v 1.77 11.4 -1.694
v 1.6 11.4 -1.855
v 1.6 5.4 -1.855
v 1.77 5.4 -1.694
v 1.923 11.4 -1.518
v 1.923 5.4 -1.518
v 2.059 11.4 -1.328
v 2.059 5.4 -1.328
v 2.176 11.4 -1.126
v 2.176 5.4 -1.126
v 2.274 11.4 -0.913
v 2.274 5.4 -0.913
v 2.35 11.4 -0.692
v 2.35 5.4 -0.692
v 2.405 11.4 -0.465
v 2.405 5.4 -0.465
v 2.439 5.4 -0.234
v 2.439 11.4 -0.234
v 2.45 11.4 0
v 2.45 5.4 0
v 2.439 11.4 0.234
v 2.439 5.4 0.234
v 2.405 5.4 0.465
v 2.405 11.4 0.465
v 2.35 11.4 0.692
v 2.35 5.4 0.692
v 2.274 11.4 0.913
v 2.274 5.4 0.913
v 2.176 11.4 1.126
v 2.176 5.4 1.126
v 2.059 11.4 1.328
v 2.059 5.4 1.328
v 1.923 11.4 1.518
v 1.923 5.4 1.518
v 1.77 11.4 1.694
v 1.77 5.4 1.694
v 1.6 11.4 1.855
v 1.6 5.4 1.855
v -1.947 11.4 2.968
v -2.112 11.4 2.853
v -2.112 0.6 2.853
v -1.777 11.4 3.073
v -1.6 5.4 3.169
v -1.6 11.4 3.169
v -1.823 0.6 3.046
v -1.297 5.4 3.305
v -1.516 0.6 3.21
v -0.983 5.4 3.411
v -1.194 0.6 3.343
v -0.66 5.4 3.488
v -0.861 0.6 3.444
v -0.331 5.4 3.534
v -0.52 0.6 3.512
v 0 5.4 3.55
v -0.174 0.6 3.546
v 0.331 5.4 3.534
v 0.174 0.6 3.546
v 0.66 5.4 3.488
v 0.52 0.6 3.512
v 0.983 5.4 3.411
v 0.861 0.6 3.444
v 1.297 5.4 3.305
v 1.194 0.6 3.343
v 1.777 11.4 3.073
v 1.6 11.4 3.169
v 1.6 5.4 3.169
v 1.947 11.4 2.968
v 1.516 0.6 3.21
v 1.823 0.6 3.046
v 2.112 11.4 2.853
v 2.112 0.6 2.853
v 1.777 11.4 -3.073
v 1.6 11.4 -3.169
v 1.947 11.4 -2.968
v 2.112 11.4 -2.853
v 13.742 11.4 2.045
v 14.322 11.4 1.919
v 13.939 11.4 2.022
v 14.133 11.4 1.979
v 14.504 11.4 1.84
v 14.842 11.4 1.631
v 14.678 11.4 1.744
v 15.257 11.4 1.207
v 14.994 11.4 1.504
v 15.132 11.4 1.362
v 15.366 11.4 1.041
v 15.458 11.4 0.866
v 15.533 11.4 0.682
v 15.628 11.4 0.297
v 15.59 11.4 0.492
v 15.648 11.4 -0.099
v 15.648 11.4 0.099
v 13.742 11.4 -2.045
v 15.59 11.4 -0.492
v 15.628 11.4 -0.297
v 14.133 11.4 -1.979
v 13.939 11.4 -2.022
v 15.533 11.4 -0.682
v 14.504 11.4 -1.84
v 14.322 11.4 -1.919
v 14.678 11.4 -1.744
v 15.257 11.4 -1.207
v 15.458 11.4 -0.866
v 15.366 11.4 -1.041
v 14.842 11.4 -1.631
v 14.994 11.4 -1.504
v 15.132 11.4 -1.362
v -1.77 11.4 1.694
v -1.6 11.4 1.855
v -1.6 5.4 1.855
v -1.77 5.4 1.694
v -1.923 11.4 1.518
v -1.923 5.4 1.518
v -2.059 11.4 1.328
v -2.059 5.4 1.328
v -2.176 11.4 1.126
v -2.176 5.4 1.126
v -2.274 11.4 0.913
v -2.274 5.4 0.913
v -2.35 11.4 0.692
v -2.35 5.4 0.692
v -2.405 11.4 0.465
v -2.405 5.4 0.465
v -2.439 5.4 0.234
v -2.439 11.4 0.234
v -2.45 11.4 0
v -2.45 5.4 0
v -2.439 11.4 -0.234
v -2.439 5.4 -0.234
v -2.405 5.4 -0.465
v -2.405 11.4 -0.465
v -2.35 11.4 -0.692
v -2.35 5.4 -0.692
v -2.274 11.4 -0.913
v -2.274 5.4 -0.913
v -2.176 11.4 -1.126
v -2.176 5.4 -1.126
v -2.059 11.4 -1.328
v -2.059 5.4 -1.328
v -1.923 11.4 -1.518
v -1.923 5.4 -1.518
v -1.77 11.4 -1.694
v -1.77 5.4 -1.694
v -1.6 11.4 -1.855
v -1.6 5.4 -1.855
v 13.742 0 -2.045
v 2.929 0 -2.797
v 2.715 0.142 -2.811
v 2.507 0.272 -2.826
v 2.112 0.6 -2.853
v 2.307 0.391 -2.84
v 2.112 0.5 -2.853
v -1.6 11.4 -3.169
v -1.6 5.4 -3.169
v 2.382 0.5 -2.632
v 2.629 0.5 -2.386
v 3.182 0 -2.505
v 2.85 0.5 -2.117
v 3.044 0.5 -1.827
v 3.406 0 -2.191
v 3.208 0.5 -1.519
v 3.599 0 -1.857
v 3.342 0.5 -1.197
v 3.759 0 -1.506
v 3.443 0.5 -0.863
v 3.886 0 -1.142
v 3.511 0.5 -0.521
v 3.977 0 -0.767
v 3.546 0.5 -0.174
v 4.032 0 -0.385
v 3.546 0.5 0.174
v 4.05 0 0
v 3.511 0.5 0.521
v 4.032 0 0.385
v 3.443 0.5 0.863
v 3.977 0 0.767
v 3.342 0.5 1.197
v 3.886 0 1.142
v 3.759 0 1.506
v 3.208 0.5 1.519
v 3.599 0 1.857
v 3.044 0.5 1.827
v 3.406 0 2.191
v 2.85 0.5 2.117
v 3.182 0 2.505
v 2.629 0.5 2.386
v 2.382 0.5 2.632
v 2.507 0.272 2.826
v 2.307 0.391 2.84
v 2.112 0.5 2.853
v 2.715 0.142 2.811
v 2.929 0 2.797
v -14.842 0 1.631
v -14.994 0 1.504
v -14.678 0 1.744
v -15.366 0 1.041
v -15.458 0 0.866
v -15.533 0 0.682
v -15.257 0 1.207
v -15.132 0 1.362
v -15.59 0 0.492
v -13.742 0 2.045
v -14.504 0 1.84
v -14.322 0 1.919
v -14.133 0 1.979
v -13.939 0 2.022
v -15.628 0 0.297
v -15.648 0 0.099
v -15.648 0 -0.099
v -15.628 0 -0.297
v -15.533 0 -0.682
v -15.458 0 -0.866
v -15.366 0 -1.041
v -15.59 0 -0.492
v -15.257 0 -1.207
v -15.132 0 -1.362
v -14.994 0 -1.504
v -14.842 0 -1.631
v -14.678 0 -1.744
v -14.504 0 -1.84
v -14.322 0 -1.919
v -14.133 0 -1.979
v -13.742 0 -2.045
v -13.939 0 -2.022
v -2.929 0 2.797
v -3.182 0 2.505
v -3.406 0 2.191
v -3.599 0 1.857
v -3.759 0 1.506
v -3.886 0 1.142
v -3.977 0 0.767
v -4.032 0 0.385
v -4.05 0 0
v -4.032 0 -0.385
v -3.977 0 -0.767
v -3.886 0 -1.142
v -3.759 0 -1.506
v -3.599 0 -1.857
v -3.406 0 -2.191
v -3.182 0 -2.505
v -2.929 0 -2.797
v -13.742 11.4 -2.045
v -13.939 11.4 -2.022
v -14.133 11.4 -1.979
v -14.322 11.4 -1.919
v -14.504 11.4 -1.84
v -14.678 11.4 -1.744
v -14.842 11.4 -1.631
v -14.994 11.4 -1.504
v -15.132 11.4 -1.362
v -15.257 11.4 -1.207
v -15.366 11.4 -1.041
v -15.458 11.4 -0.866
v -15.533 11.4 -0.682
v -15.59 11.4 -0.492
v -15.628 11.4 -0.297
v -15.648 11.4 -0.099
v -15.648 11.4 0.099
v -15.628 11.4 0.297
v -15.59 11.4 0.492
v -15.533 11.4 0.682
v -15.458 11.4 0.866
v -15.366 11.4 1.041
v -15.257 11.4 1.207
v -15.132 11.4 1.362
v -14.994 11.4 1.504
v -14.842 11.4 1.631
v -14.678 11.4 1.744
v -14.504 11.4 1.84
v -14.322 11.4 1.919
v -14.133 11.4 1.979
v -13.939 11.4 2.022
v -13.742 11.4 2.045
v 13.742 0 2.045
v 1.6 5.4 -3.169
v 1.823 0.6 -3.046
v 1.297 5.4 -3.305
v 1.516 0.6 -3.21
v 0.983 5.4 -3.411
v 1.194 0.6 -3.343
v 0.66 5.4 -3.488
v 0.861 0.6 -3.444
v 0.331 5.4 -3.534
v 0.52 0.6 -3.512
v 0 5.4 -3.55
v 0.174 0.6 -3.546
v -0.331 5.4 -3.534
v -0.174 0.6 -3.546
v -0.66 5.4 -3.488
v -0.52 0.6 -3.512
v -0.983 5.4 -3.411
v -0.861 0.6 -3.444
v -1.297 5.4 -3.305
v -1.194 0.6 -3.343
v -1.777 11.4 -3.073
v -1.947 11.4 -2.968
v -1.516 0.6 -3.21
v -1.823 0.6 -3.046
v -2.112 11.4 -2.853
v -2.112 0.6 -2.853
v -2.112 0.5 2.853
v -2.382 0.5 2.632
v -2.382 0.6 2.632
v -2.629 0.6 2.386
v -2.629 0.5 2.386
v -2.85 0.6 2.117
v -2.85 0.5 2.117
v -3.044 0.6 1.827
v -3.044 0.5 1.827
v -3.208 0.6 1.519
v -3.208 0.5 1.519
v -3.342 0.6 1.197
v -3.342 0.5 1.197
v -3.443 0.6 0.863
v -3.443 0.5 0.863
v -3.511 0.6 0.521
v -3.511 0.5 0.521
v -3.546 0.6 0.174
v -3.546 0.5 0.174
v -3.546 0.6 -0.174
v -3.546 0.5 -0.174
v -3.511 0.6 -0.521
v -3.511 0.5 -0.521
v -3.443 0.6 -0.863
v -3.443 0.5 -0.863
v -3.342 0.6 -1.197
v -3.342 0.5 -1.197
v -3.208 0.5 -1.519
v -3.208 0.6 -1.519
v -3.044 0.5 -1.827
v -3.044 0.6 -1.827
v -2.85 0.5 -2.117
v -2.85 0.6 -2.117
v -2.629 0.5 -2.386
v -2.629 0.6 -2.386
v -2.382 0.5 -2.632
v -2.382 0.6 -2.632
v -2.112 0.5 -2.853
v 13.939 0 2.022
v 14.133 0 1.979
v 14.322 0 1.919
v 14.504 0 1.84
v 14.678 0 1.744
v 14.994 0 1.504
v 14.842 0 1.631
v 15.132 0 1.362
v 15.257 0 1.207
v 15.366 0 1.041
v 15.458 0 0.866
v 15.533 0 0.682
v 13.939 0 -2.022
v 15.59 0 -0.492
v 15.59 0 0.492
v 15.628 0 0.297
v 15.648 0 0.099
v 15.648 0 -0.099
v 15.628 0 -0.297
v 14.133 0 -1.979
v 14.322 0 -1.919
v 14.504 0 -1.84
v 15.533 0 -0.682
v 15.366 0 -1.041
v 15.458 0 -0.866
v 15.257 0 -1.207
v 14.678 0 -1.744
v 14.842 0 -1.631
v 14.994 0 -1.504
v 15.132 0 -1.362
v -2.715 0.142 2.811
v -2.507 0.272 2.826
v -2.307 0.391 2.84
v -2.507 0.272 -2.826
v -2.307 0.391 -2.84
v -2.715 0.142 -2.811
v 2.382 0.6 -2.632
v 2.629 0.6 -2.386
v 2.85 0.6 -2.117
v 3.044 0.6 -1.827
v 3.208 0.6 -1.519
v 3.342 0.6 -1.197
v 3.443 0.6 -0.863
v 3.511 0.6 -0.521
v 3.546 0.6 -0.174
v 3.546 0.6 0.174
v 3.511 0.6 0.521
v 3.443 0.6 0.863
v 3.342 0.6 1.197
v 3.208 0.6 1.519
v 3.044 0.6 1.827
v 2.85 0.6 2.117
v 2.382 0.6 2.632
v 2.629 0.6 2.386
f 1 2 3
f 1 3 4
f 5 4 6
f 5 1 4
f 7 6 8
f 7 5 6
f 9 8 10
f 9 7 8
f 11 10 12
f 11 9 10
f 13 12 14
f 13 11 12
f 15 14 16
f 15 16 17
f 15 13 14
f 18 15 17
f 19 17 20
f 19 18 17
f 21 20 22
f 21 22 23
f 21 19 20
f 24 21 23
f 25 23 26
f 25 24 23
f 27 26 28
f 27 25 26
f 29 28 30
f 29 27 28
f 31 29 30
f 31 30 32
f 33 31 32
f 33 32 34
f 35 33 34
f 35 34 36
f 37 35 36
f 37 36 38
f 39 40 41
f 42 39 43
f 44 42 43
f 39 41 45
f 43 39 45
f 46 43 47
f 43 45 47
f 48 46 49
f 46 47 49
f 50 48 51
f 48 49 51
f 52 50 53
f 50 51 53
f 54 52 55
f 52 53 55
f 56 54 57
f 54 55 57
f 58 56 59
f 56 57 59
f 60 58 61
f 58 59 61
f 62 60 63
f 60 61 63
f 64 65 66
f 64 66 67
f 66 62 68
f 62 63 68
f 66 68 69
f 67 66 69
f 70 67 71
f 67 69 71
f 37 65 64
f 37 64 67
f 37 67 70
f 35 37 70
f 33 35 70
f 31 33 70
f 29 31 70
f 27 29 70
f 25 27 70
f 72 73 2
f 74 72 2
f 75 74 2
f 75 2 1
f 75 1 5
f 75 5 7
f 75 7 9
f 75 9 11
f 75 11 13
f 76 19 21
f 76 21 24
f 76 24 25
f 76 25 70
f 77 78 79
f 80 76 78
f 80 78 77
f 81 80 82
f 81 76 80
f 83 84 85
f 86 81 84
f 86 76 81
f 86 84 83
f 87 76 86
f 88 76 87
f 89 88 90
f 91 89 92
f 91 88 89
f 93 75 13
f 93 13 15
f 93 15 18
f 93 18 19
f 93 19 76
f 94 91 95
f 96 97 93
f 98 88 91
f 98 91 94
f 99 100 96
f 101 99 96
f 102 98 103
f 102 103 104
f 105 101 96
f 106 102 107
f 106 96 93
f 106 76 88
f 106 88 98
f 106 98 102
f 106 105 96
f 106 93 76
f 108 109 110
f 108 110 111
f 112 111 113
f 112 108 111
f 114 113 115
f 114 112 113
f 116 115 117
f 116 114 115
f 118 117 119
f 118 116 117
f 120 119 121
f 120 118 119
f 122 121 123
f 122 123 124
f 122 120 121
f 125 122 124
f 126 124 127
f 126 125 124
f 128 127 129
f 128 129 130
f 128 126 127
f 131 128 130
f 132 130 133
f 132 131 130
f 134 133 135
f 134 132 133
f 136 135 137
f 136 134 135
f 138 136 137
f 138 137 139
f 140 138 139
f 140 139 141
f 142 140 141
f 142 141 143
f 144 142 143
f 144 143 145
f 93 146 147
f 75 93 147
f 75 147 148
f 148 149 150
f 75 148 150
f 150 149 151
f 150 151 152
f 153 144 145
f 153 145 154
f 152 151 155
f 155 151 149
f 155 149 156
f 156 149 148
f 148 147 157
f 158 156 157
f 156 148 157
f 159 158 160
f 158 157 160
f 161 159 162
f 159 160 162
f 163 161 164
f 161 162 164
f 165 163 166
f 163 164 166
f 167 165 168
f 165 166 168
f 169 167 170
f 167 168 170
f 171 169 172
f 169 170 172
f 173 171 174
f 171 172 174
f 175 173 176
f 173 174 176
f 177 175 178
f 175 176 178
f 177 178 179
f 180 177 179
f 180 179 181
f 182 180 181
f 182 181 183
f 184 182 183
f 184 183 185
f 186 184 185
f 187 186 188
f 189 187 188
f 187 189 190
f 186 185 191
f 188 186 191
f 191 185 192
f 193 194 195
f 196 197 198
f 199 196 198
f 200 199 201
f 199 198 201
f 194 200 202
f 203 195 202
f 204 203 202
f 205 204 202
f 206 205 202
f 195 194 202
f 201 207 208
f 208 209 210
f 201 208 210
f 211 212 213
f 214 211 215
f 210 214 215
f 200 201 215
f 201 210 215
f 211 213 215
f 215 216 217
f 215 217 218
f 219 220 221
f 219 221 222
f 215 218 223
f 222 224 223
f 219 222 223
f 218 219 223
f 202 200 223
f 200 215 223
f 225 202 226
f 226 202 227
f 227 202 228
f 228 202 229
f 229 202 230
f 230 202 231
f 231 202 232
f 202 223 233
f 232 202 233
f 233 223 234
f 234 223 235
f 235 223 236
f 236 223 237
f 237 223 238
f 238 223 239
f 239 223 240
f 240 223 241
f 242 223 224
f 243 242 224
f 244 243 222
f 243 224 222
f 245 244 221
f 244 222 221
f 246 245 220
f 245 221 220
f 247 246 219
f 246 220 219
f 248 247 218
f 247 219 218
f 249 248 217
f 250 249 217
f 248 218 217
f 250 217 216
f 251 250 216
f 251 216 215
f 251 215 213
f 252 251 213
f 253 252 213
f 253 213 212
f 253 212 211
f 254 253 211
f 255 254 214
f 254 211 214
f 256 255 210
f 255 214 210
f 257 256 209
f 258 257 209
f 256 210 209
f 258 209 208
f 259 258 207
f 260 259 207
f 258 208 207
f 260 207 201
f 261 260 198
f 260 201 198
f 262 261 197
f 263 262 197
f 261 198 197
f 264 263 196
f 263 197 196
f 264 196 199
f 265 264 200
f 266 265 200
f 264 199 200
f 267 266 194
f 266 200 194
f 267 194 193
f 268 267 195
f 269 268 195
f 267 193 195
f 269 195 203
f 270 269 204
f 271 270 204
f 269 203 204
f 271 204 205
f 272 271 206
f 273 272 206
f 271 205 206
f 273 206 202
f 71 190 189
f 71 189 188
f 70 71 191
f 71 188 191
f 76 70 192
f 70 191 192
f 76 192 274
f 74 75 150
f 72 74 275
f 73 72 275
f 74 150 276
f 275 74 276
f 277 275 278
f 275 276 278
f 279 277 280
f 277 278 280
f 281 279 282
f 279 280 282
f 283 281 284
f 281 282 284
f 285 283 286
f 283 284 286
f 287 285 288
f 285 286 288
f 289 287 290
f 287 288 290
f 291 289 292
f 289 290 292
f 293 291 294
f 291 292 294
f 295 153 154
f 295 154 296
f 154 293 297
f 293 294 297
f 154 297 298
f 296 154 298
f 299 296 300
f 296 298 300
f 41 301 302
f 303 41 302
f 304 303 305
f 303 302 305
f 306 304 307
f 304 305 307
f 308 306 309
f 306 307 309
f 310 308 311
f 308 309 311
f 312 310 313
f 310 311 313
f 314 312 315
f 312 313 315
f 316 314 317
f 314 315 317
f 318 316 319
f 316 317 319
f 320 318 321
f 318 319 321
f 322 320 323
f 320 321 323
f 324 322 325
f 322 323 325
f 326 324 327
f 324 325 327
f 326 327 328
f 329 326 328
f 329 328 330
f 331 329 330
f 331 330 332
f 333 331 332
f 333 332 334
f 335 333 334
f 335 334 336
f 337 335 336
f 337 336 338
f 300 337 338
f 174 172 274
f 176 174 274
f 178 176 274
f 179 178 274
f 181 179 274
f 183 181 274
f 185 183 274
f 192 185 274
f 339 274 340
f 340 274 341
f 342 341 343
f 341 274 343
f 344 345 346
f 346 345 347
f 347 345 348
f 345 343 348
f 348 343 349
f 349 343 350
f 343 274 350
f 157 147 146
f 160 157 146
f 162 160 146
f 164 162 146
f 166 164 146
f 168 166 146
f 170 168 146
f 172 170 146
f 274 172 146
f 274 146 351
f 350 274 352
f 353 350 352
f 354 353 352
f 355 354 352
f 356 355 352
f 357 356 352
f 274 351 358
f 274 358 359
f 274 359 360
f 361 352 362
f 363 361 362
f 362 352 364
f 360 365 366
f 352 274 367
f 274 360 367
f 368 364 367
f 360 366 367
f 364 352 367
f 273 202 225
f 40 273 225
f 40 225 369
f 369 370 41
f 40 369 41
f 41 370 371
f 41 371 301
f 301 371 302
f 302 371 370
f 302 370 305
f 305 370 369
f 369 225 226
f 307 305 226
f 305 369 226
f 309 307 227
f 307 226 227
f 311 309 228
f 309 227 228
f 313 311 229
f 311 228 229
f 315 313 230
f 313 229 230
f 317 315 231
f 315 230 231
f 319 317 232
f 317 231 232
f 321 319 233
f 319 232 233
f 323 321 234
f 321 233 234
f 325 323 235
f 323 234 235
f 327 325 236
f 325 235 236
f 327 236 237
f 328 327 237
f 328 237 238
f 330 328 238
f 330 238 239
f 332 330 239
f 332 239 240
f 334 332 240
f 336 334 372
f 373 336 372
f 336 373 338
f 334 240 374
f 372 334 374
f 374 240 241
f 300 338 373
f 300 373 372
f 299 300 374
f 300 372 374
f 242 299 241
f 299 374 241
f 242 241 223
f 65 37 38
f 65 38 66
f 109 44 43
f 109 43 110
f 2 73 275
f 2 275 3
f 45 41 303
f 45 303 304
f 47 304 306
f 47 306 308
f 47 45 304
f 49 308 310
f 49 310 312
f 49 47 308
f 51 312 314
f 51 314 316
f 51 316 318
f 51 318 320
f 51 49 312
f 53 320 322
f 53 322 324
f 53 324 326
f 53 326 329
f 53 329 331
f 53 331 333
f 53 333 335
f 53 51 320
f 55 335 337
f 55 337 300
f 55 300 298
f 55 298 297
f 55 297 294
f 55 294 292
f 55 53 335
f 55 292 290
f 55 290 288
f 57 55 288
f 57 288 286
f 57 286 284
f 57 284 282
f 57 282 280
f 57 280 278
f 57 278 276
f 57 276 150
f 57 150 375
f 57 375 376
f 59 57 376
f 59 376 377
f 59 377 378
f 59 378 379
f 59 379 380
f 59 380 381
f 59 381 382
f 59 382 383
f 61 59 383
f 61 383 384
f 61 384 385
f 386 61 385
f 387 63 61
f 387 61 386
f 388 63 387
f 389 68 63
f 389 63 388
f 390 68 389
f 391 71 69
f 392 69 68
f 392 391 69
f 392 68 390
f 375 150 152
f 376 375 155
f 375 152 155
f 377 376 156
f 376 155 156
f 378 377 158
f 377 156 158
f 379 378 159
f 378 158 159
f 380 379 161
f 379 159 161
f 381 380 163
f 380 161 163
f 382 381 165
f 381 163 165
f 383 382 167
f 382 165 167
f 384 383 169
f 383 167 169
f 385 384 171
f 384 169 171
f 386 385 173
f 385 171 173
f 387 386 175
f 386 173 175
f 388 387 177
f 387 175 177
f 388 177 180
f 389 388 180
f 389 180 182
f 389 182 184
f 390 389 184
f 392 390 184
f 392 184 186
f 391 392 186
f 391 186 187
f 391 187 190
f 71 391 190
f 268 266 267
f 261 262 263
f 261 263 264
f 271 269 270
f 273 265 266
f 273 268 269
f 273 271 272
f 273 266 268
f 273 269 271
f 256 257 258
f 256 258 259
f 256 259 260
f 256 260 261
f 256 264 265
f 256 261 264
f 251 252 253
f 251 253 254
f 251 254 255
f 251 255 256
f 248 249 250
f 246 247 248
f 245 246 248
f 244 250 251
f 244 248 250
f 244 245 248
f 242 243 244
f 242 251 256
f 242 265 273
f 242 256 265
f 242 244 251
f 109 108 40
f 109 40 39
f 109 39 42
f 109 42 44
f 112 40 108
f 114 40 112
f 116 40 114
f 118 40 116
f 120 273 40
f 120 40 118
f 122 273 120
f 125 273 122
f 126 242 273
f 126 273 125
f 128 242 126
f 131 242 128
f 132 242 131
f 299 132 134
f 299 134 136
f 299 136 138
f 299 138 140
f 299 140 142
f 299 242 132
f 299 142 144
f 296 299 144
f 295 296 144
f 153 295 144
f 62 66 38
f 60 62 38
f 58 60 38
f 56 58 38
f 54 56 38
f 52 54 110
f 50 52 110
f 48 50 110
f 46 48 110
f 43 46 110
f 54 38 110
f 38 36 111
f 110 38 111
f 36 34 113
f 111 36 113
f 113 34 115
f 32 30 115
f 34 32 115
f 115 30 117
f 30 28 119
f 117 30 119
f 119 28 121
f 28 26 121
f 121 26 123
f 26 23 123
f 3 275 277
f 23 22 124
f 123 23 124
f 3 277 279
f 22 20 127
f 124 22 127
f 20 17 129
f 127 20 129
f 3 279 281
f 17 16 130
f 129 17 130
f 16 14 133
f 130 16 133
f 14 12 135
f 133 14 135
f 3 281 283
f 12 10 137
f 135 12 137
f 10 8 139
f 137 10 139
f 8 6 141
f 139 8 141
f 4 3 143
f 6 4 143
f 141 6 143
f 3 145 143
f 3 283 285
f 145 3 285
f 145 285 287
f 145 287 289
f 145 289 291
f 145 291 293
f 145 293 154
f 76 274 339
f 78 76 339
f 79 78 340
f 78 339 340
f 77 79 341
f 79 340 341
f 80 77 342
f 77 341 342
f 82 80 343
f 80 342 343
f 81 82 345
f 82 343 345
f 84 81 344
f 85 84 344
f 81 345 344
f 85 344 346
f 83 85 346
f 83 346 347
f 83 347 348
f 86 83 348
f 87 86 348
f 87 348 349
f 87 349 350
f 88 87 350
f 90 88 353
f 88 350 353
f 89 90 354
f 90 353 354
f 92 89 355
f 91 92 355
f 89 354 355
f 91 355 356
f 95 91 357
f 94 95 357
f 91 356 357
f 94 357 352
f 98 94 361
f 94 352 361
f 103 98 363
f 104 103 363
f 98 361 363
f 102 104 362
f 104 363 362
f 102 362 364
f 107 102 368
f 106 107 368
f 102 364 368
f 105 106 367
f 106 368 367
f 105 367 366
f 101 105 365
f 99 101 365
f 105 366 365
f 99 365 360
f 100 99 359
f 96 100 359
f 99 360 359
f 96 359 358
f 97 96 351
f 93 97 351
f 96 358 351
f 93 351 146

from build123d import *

# Parameters (mm, degrees)
BOSS_EXTRUDE1_DEPTH = 11.4
CUT_EXTRUDE1_DEPTH  = 0.6
CHAMFER1_SIZE       = 0.5
CUT_EXTRUDE2_DEPTH  = 6


with BuildPart() as part:
    # Sketch2 → Boss-Extrude1 (new body)
    with BuildSketch(Plane(origin=(0, 0, 0), x_dir=(1, 0, 0), z_dir=(0, 1, 0))):
        with BuildLine():
            Line((-13.742133053, -2.045066795), (-2.112067201, -2.853361551))
            ThreePointArc((-2.112067201, -2.853361551), (0, -3.55), (2.112067201, -2.853361551))
            Line((2.112067201, -2.853361551), (13.742133053, -2.045066795))
            ThreePointArc((13.742133053, -2.045066795), (15.65, 0), (13.742133053, 2.045066795))
            Line((13.742133053, 2.045066795), (2.112067201, 2.853361551))
            ThreePointArc((2.112067201, 2.853361551), (0, 3.55), (-2.112067201, 2.853361551))
            Line((-2.112067201, 2.853361551), (-13.742133053, 2.045066795))
            ThreePointArc((-13.742133053, 2.045066795), (-15.65, 0), (-13.742133053, -2.045066795))
        make_face()
    extrude(amount=BOSS_EXTRUDE1_DEPTH)

    # Sketch3 → Cut-Extrude1 (cut)
    with BuildSketch(Plane.XZ):
        with BuildLine():
            ThreePointArc((-2.112067201, 2.853361551), (0, -3.55), (2.112067201, 2.853361551))
            ThreePointArc((2.112067201, 2.853361551), (0, 3.55), (-2.112067201, 2.853361551))
        make_face()
    extrude(amount=-CUT_EXTRUDE1_DEPTH, mode=Mode.SUBTRACT)

    # Chamfer1
    chamfer1_edges = [part.edges().sort_by_distance(p)[0] for p in [
        (-3.55, 0, 0),
        (3.55, 0, 0),
    ]]
    chamfer(chamfer1_edges, length=CHAMFER1_SIZE)

    # Shaft Key → Cut-Extrude2 (cut)
    with BuildSketch(Plane(origin=(0, 11.4, 0), x_dir=(1, 0, 0), z_dir=(0, 1, 0))):
        with BuildLine():
            Line((1.6, -1.855397532), (1.6, -5.45))
            Line((1.6, -5.45), (-1.6, -5.45))
            Line((-1.6, -5.45), (-1.6, -1.855397532))
            ThreePointArc((-1.6, -1.855397532), (-2.45, 0), (-1.6, 1.855397532))
            Line((-1.6, 1.855397532), (-1.6, 5.45))
            Line((-1.6, 5.45), (1.6, 5.45))
            Line((1.6, 5.45), (1.6, 1.855397532))
            ThreePointArc((1.6, 1.855397532), (2.45, 0), (1.6, -1.855397532))
        make_face()
    extrude(amount=-CUT_EXTRUDE2_DEPTH, mode=Mode.SUBTRACT)


solid = part.part
